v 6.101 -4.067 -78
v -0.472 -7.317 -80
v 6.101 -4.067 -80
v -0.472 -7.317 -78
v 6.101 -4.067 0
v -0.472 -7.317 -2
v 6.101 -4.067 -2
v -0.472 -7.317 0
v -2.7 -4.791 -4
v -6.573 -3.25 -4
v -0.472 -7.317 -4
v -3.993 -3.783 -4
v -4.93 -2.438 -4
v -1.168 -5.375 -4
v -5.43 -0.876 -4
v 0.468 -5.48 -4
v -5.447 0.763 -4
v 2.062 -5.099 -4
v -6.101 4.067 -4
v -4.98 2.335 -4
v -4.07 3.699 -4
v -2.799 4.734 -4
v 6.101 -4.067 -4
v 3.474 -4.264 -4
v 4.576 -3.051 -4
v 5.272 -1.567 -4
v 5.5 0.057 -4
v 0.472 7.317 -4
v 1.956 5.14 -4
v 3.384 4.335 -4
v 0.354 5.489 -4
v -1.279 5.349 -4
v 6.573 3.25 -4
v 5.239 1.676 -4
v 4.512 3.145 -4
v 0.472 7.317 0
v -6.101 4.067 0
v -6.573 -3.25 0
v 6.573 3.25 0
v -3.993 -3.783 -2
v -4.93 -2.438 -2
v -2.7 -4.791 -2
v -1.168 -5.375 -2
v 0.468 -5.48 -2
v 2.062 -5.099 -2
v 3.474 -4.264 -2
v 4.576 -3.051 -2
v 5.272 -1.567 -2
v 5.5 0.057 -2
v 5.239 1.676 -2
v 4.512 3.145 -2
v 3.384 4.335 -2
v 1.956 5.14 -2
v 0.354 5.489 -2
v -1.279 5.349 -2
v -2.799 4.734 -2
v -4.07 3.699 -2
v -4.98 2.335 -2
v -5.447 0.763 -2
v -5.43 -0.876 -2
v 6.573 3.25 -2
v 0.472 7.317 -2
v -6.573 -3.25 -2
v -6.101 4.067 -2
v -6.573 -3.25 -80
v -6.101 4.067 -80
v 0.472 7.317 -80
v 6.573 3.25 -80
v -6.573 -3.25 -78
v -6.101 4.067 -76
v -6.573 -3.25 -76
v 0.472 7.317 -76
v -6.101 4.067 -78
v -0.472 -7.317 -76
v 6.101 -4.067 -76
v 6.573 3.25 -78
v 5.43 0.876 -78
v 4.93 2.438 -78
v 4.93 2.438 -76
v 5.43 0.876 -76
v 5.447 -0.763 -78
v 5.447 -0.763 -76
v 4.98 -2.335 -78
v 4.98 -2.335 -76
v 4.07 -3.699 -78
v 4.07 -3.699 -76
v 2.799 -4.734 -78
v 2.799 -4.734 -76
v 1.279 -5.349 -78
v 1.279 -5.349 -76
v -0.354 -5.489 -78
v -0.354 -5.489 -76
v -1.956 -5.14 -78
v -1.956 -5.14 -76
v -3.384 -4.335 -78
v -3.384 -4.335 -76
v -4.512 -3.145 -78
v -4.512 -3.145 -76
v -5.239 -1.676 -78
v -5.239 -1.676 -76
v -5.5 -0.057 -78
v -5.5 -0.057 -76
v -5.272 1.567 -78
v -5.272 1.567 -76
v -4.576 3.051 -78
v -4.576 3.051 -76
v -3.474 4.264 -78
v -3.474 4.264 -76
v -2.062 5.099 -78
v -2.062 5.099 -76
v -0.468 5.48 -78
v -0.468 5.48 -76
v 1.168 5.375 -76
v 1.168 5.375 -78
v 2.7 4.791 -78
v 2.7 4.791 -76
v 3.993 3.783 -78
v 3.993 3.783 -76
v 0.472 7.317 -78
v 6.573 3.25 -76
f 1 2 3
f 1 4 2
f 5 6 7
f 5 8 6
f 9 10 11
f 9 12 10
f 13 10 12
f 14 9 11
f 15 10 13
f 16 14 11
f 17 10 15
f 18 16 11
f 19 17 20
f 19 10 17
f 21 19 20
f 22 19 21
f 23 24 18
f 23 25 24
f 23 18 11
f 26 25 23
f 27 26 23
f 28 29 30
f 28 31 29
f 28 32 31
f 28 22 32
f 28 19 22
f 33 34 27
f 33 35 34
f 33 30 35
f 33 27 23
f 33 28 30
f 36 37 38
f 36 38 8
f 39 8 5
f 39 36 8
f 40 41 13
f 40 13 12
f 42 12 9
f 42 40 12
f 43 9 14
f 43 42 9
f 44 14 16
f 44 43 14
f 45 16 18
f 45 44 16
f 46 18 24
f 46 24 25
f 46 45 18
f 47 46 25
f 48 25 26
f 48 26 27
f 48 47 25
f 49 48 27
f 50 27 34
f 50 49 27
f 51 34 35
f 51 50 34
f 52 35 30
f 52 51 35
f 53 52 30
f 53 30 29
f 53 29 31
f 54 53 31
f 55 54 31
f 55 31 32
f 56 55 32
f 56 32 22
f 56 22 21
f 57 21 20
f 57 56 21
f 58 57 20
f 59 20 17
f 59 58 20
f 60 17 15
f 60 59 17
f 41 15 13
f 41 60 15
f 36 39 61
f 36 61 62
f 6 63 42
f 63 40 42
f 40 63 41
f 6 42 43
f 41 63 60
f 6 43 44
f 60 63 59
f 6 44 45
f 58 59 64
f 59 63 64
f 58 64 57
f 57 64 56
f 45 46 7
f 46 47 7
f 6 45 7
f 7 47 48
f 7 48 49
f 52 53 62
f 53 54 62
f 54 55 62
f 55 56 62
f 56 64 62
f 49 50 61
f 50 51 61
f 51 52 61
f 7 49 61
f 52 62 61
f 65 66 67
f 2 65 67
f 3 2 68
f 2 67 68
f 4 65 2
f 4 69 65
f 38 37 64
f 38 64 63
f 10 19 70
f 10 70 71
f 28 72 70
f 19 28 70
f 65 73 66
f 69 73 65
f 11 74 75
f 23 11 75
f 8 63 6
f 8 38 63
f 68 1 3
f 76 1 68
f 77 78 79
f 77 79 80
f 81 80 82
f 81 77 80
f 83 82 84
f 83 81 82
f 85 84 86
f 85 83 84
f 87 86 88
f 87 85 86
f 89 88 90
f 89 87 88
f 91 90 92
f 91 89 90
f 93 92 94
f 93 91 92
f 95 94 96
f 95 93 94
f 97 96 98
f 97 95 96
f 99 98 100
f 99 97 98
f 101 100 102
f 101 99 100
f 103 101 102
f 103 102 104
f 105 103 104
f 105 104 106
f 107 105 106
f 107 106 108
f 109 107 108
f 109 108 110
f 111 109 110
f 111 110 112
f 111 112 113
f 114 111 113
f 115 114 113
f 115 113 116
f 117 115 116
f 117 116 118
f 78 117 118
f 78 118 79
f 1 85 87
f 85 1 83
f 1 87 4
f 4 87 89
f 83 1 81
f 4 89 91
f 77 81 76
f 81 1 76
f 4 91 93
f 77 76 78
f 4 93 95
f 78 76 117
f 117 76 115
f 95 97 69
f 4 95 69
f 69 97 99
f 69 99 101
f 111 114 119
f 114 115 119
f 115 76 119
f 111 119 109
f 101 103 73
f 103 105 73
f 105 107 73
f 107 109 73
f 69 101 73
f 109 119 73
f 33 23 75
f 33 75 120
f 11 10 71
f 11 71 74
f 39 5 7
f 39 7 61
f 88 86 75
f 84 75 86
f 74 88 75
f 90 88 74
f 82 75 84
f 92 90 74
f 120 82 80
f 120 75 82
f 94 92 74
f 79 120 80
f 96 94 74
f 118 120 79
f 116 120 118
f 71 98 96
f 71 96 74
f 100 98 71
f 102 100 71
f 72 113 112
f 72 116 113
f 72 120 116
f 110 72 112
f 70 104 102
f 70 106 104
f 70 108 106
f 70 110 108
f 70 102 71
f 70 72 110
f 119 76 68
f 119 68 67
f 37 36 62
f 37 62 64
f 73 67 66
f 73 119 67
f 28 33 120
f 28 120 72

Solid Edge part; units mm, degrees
sketch "Sketch1" plane through (0, 0, 0) normal (0, 0, 1) x (1, 0, 0)
  line L0 (-6.1009, 4.0673) -> (-6.5728, -3.2499)
  line L1 (-6.5728, -3.2499) -> (-0.4719, -7.3171)
  line L2 (-0.4719, -7.3171) -> (6.1009, -4.0673)
  line L3 (6.1009, -4.0673) -> (6.5728, 3.2499)
  line L4 (6.5728, 3.2499) -> (0.4719, 7.3171)
  line L5 (0.4719, 7.3171) -> (-6.1009, 4.0673)
extrude "Protrusion1" add sketch "Sketch1" against normal blind 80
sketch "Sketch2" plane through (0, 0, -2) normal (0, 0, 1) x (-0.8964, -0.4432, 0)
  circle A0 centre (0, 0) radius 5.5
  circle A1 centre (0, 0) radius 13.1424
extrude "ExtrudedCutout_1" cut sketch "Sketch2" against normal blind 2
sketch "Sketch3" plane through (0, 0, -78) normal (0, 0, -1) x (0.8964, 0.4432, 0)
  circle A0 centre (0, 0) radius 5.5
  circle A1 centre (0, 0) radius 13.1424
extrude "ExtrudedCutout_2" cut sketch "Sketch3" against normal blind 2
properties part number "BumbleB0196"
